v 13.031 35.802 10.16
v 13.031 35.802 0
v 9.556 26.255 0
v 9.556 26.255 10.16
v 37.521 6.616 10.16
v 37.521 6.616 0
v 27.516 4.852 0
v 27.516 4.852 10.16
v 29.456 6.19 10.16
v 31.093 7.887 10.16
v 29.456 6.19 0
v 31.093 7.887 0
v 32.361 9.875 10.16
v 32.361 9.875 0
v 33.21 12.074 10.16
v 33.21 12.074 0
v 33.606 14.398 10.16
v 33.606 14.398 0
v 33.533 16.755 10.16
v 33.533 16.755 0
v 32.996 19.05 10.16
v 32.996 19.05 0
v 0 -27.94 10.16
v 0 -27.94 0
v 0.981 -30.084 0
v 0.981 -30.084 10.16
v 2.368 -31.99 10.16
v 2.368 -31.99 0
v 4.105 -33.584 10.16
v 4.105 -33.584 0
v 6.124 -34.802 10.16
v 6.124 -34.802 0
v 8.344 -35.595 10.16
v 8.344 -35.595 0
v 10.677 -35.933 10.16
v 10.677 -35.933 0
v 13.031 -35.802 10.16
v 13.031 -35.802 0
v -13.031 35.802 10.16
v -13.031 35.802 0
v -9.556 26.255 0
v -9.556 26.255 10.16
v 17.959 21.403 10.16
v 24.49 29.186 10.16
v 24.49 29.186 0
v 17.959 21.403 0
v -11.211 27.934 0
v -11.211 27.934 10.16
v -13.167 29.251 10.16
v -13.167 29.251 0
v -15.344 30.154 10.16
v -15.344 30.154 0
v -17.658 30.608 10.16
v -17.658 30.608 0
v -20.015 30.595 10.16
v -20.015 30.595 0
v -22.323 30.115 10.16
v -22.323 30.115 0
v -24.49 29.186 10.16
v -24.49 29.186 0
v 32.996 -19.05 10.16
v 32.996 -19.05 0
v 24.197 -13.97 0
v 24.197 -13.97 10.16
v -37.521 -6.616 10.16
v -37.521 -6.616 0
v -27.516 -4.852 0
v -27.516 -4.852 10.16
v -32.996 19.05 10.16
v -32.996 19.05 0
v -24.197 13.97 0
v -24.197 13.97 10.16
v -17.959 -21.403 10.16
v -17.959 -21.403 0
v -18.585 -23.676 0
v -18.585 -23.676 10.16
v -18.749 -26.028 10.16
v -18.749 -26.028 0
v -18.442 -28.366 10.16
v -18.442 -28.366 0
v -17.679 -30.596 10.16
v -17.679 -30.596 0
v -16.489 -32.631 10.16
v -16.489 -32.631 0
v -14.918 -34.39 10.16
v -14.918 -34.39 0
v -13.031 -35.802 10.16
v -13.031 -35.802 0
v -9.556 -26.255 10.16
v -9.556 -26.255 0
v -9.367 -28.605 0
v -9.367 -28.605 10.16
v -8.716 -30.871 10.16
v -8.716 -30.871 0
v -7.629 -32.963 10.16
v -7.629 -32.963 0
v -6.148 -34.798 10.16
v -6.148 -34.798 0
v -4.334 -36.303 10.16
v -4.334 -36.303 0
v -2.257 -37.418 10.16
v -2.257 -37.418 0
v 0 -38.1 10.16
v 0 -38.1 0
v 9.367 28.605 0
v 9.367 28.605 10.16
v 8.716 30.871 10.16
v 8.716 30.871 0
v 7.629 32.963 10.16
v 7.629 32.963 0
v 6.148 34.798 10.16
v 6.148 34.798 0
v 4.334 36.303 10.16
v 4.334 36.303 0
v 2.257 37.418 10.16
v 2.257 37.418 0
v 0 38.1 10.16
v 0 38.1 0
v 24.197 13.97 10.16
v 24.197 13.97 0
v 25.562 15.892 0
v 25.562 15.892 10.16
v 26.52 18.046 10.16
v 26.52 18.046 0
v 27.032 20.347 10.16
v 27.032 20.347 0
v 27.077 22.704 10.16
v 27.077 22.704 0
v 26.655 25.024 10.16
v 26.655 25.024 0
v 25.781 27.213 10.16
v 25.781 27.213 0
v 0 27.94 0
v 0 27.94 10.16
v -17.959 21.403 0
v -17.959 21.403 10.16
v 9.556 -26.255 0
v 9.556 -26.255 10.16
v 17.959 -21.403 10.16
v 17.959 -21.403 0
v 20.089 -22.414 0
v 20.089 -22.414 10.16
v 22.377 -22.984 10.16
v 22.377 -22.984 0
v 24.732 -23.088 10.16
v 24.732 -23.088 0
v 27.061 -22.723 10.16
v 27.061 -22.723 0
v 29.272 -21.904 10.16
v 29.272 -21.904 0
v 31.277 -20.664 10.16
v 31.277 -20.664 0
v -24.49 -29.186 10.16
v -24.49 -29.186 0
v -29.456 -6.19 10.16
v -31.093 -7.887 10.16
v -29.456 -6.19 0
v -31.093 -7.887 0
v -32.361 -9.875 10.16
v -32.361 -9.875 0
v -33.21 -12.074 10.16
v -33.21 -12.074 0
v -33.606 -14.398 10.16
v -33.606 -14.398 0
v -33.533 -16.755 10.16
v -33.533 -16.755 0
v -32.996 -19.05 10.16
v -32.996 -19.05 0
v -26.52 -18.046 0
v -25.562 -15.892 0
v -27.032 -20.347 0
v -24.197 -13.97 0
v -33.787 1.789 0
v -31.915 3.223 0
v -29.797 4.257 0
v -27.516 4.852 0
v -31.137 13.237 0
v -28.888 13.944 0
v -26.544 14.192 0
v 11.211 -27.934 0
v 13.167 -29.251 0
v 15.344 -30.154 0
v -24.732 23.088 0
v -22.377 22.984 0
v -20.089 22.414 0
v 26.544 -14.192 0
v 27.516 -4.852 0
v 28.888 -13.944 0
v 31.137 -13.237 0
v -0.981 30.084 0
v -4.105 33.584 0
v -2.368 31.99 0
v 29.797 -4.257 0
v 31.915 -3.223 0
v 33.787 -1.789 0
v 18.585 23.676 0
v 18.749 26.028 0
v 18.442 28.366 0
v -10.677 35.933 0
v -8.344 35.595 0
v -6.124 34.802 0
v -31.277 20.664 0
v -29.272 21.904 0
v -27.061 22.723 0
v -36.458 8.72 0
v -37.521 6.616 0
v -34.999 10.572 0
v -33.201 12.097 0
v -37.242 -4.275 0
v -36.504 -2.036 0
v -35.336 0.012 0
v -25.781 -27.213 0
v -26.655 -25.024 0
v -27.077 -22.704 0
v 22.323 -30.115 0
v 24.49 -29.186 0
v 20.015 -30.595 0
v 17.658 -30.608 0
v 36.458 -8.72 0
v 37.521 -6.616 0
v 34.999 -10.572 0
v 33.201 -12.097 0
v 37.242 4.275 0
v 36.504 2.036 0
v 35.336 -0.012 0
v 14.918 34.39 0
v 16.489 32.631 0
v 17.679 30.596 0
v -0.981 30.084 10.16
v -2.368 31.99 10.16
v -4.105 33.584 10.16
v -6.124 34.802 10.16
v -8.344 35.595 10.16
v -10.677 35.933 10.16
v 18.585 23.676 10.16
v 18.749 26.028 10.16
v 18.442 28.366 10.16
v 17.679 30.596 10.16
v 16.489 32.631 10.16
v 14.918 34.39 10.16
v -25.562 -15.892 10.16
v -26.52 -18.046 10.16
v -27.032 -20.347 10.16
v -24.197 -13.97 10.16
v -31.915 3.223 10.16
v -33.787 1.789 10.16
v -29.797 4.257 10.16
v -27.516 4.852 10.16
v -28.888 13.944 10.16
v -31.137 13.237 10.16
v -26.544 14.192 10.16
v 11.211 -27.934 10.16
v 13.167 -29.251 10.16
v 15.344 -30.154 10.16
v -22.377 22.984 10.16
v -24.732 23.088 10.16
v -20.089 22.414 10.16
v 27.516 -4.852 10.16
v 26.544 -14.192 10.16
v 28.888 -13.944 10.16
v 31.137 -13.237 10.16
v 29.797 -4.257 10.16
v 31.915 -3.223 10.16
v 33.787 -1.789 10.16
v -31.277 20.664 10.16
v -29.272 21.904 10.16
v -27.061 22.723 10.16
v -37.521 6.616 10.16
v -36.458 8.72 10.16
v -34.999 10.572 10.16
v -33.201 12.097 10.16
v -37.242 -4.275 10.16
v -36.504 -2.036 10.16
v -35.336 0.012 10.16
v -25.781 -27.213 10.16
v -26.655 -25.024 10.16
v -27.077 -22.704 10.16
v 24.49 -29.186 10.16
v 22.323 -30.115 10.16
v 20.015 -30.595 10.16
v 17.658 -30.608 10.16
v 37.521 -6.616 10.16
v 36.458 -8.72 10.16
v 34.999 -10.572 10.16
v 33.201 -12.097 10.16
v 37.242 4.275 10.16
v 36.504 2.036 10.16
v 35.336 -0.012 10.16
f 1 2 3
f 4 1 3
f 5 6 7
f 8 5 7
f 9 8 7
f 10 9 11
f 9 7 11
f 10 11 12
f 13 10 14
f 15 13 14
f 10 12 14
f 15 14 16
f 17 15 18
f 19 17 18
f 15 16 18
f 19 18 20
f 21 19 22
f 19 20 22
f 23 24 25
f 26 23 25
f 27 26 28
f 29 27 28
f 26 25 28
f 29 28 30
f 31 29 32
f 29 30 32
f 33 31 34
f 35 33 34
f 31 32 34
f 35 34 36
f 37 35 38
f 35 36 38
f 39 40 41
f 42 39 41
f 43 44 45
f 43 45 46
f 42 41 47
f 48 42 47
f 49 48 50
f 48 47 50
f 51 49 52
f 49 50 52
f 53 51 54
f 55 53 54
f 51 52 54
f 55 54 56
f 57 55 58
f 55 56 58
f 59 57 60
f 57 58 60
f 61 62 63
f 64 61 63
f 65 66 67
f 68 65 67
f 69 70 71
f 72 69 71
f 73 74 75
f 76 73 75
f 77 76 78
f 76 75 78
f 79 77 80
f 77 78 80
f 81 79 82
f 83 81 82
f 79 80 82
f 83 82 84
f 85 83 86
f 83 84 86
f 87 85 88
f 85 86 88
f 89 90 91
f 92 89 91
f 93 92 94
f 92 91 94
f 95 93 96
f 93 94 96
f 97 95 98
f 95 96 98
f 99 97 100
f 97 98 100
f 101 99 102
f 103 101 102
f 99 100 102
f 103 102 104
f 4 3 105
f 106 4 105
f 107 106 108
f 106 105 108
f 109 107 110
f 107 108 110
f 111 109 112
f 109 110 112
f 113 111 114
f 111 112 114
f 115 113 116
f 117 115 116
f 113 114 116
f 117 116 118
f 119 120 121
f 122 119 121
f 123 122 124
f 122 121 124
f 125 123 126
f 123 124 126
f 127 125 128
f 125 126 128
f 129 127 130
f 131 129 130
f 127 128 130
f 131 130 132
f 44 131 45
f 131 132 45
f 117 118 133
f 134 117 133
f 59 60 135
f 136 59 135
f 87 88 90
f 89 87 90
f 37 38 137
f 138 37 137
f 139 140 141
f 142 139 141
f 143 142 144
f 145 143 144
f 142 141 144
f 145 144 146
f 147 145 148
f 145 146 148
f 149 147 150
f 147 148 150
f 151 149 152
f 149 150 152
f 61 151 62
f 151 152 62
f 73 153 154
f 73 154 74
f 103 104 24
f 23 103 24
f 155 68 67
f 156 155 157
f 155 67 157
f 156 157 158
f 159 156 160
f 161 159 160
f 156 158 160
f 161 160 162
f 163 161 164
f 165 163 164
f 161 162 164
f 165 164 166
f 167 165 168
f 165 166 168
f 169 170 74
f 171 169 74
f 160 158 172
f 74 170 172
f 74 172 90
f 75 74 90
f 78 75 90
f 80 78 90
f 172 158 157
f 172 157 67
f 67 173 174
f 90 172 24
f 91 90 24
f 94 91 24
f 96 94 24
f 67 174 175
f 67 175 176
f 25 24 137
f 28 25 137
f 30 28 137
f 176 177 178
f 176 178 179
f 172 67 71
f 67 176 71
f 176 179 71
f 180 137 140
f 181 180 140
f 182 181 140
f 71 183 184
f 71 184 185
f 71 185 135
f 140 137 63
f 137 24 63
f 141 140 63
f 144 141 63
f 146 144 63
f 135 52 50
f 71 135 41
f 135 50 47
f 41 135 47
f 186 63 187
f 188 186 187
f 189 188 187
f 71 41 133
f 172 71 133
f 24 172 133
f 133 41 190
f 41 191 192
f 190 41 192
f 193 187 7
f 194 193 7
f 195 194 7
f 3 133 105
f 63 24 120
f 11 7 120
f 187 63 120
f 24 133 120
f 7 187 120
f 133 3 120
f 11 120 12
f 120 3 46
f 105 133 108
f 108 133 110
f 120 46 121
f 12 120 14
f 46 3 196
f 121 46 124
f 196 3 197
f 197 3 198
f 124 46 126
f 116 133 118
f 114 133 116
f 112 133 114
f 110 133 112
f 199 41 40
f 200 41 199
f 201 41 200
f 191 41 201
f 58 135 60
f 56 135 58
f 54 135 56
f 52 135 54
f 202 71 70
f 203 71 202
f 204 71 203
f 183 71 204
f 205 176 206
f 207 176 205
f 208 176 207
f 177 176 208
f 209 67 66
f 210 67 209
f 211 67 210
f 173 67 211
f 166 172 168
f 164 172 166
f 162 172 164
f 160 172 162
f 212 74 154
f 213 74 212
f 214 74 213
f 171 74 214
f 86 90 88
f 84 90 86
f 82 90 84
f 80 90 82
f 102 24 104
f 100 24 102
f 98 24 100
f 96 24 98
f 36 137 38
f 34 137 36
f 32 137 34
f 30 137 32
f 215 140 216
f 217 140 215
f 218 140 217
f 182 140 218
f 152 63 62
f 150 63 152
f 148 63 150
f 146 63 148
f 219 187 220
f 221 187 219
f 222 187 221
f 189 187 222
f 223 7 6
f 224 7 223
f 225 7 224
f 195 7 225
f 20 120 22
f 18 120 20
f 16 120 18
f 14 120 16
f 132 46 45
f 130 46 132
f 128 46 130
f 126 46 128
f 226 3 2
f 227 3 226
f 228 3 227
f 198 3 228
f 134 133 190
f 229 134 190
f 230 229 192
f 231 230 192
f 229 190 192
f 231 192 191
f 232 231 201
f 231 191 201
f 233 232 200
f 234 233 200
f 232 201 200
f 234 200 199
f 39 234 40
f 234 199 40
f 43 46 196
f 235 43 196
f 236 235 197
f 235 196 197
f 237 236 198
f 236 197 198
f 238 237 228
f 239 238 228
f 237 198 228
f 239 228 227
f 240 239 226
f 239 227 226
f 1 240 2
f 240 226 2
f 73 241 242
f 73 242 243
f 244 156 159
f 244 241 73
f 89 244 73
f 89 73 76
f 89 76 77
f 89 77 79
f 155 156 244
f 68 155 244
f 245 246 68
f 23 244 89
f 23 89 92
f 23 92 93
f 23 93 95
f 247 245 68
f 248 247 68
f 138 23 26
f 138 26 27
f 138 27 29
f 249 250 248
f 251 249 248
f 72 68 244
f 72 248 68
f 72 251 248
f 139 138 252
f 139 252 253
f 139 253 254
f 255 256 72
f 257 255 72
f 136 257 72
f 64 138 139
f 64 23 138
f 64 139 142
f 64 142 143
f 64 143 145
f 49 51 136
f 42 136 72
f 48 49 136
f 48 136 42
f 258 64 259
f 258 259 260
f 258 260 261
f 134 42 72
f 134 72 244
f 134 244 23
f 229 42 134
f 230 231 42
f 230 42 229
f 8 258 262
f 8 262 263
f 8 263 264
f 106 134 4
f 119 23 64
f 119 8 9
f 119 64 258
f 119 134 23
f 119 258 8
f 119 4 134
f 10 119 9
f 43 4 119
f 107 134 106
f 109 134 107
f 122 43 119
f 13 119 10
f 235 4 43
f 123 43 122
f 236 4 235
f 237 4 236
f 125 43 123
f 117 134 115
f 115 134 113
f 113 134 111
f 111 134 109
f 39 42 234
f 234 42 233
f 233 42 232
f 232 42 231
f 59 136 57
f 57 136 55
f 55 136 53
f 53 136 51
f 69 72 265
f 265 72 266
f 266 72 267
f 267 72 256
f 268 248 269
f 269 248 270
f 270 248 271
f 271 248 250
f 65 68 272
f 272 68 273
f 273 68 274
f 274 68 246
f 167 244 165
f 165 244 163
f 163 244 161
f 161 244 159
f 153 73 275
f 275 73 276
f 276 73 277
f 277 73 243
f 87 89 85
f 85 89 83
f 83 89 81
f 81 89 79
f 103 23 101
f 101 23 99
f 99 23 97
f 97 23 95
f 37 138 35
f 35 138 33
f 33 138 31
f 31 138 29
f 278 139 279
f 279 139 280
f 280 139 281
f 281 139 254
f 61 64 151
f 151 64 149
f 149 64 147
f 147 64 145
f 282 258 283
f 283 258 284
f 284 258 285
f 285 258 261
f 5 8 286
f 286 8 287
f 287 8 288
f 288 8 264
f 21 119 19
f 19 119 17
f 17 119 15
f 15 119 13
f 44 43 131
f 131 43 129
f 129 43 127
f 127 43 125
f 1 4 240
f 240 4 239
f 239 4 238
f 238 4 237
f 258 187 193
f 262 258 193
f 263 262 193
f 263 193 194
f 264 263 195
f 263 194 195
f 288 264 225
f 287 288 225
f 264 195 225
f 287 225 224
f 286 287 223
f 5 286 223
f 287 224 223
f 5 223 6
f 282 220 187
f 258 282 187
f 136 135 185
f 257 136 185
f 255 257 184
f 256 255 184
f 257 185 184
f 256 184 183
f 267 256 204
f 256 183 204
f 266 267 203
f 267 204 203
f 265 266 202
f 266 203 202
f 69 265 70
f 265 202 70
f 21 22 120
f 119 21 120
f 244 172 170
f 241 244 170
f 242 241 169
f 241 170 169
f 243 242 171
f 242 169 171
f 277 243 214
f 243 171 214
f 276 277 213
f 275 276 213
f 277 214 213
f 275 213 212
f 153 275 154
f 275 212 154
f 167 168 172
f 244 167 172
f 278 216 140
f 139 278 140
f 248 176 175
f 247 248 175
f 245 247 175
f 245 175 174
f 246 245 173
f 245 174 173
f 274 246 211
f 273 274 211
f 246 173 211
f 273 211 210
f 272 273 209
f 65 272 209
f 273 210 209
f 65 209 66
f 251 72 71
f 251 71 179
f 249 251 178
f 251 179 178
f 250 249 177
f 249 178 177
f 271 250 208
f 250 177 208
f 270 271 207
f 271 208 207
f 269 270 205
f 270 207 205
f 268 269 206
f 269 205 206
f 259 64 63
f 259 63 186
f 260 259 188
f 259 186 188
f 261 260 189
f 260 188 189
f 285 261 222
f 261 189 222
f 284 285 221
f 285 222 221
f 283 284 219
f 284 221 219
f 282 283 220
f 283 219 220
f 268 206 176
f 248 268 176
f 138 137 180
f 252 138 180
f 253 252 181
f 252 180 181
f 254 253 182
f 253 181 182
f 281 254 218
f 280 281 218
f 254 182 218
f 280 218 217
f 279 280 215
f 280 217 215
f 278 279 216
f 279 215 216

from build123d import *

# Parameters (mm, degrees)
F1_DEPTH = 10.16


with BuildPart() as f1:
    # F0 (on Top) → F1 (new body)
    with BuildSketch(Plane.XY):
        with BuildLine():
            ThreePointArc((9.556043, 26.255012), (6.934197, 33.917019), (0, 38.1))
            Line((0, 38.1), (0, 27.94))
            ThreePointArc((0, 27.94), (-5.08429, 34.243207), (-13.030967, 35.802289))
            Line((-13.030967, 35.802289), (-9.556043, 26.255012))
            ThreePointArc((-9.556043, 26.255012), (-16.489536, 30.43916), (-24.490208, 29.186293))
            Line((-24.490208, 29.186293), (-17.959486, 21.403282))
            ThreePointArc((-17.959486, 21.403282), (-25.905901, 22.9637), (-32.995568, 19.05))
            Line((-32.995568, 19.05), (-24.19675, 13.97))
            ThreePointArc((-24.19675, 13.97), (-32.197632, 12.71848), (-37.521175, 6.615996))
            Line((-37.521175, 6.615996), (-27.515529, 4.85173))
            ThreePointArc((-27.515529, 4.85173), (-34.605854, 0.939223), (-37.521175, -6.615996))
            Line((-37.521175, -6.615996), (-27.515529, -4.85173))
            ThreePointArc((-27.515529, -4.85173), (-32.840098, -10.953318), (-32.995568, -19.05))
            Line((-32.995568, -19.05), (-24.19675, -13.97))
            ThreePointArc((-24.19675, -13.97), (-27.113343, -21.524728), (-24.490208, -29.186293))
            Line((-24.490208, -29.186293), (-17.959486, -21.403282))
            ThreePointArc((-17.959486, -21.403282), (-18.116318, -29.499937), (-13.030967, -35.802289))
            Line((-13.030967, -35.802289), (-9.556043, -26.255012))
            ThreePointArc((-9.556043, -26.255012), (-6.934197, -33.917019), (0, -38.1))
            Line((0, -38.1), (0, -27.94))
            ThreePointArc((0, -27.94), (5.08429, -34.243207), (13.030967, -35.802289))
            Line((13.030967, -35.802289), (9.556043, -26.255012))
            ThreePointArc((9.556043, -26.255012), (16.489536, -30.43916), (24.490208, -29.186293))
            Line((24.490208, -29.186293), (17.959486, -21.403282))
            ThreePointArc((17.959486, -21.403282), (25.905901, -22.9637), (32.995568, -19.05))
            Line((32.995568, -19.05), (24.19675, -13.97))
            ThreePointArc((24.19675, -13.97), (32.197632, -12.71848), (37.521175, -6.615996))
            Line((37.521175, -6.615996), (27.515529, -4.85173))
            ThreePointArc((27.515529, -4.85173), (34.605854, -0.939223), (37.521175, 6.615996))
            Line((37.521175, 6.615996), (27.515529, 4.85173))
            ThreePointArc((27.515529, 4.85173), (32.840098, 10.953318), (32.995568, 19.05))
            Line((32.995568, 19.05), (24.19675, 13.97))
            ThreePointArc((24.19675, 13.97), (27.113343, 21.524728), (24.490208, 29.186293))
            Line((24.490208, 29.186293), (17.959486, 21.403282))
            ThreePointArc((17.959486, 21.403282), (18.116318, 29.499937), (13.030967, 35.802289))
            Line((13.030967, 35.802289), (9.556043, 26.255012))
        make_face()
    extrude(amount=F1_DEPTH)


solid = f1.part
